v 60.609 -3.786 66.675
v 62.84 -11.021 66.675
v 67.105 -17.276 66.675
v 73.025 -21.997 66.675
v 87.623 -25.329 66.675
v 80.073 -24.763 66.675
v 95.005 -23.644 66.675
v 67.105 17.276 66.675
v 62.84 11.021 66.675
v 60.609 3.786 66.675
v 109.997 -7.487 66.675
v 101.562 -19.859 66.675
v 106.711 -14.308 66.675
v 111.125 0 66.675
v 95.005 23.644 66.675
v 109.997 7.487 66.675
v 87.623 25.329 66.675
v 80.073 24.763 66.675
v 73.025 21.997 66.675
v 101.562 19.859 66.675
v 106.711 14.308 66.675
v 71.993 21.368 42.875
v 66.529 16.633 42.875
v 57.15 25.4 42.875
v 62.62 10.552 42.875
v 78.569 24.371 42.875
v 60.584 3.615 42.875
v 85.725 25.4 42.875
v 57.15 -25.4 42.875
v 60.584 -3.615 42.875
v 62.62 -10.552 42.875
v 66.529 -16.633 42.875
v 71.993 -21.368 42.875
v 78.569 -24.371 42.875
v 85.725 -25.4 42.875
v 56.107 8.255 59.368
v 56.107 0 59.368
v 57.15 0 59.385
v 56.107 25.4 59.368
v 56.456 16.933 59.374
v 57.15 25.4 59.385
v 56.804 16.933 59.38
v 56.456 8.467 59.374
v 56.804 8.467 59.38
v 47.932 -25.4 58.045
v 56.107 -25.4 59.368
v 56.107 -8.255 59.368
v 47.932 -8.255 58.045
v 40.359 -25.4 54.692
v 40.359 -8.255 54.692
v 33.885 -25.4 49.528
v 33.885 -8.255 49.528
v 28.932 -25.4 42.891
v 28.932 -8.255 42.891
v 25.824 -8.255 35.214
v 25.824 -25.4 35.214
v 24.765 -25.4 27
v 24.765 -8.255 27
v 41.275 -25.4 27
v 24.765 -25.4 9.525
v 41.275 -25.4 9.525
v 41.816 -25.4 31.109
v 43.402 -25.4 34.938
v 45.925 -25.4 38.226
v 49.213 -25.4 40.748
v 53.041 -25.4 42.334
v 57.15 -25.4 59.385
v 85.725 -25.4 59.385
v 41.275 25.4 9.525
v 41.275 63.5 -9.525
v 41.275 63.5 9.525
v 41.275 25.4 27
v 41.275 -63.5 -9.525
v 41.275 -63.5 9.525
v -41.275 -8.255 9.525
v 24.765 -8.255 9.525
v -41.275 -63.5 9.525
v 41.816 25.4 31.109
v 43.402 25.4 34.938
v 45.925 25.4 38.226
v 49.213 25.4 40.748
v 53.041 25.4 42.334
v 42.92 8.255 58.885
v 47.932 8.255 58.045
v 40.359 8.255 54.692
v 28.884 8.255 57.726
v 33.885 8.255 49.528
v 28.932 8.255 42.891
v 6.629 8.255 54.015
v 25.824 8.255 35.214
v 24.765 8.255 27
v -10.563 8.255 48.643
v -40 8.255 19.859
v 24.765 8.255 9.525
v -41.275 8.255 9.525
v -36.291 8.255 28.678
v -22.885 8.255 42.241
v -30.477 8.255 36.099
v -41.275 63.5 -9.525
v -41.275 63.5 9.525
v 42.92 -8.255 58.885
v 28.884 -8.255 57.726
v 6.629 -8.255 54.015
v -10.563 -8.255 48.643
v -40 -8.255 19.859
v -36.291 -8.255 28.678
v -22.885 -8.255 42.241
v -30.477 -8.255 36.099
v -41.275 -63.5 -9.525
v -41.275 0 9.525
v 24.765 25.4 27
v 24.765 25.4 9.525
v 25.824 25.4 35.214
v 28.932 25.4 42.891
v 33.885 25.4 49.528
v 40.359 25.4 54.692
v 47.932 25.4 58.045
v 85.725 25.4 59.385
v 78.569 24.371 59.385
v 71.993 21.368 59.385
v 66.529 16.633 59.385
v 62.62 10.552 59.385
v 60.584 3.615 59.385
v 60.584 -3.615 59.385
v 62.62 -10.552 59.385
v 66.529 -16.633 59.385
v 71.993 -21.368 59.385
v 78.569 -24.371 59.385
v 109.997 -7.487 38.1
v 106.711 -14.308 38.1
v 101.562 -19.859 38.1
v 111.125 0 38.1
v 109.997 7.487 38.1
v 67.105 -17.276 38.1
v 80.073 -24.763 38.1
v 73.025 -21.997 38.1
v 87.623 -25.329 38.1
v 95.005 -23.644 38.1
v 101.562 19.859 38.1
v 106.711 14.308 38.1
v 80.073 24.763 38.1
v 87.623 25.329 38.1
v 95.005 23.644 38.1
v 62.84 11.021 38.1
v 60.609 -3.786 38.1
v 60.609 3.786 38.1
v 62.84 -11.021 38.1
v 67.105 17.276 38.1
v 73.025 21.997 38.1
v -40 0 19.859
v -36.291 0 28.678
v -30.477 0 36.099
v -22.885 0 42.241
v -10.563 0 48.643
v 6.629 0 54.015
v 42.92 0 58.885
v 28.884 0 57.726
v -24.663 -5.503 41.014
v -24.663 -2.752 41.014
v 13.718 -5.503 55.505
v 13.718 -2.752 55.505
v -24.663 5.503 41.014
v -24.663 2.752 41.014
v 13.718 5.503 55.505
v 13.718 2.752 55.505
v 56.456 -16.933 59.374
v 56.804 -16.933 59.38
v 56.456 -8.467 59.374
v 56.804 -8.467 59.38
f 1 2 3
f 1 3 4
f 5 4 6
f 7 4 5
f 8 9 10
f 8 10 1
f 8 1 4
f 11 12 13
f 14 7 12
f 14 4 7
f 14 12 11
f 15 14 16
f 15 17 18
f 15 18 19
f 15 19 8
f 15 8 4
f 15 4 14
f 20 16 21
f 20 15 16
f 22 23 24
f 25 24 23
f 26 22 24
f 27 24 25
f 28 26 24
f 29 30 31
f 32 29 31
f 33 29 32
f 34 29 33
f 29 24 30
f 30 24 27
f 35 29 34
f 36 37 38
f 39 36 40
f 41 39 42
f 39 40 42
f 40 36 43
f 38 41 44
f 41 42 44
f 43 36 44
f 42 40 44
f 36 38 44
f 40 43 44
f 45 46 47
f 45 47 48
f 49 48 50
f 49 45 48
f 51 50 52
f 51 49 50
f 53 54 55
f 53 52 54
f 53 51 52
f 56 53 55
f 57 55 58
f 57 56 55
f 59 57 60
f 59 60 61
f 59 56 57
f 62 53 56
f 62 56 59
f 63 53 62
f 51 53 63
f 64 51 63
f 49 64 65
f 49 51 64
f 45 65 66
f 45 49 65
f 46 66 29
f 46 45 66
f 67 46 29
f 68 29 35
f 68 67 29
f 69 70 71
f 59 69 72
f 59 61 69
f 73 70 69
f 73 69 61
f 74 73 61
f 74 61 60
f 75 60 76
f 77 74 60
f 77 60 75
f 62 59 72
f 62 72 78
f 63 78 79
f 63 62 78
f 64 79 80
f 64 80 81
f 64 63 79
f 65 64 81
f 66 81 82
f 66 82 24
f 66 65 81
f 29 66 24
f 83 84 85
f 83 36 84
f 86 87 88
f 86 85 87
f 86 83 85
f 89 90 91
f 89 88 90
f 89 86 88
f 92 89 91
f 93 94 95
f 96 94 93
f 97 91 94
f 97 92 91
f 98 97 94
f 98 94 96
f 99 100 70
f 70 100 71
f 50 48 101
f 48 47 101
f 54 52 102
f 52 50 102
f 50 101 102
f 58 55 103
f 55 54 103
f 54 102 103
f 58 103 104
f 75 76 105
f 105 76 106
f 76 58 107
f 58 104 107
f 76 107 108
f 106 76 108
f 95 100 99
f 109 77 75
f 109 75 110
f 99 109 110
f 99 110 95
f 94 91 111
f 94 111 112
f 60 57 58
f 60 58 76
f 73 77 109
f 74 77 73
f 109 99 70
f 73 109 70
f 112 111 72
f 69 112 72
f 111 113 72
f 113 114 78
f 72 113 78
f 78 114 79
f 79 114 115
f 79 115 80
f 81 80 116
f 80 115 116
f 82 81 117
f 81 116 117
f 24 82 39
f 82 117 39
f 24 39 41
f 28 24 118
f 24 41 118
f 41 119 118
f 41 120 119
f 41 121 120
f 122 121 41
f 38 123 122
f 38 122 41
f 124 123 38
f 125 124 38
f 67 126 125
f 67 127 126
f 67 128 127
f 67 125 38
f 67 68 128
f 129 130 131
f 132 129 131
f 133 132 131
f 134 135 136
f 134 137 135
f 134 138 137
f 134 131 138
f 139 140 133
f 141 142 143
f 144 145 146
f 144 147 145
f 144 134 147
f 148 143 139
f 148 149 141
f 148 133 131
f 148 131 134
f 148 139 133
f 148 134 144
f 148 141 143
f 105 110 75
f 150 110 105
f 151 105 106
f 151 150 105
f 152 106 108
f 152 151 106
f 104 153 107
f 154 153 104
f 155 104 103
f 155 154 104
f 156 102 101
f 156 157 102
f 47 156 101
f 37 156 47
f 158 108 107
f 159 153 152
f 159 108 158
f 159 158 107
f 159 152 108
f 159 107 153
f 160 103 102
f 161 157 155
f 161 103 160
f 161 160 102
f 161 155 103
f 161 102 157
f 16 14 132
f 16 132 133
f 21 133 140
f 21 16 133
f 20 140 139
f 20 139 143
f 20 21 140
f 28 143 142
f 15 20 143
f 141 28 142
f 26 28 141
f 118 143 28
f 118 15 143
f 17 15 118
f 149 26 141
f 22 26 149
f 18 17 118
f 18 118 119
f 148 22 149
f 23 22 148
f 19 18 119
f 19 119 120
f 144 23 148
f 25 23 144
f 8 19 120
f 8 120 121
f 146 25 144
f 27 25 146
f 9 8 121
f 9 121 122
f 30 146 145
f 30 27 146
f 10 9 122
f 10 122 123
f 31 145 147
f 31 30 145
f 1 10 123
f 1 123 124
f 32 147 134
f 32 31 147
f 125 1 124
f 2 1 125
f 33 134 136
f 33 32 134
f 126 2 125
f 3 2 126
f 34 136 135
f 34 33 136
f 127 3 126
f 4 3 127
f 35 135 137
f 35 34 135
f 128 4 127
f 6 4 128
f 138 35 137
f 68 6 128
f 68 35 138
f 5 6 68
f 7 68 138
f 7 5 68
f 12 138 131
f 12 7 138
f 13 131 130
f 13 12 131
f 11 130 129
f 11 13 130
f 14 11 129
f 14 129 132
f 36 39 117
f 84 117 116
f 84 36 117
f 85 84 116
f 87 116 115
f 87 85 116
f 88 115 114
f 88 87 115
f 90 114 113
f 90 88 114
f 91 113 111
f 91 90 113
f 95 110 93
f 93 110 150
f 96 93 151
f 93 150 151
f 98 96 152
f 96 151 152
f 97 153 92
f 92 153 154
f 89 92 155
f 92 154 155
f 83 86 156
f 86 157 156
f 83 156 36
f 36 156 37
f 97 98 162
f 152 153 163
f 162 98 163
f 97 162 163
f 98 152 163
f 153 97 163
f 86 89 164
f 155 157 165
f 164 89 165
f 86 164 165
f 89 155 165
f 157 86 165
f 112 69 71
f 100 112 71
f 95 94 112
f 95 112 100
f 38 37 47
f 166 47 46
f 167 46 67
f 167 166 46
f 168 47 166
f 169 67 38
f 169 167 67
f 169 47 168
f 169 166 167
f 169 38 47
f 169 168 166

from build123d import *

# Parameters (mm, degrees)
F1_DEPTH = 63.5
F0_W     = 25.4
F0_H     = 16.5099985898
F2_DEPTH = 25.4
F3_DEPTH = 8.255


with BuildPart() as f1:
    # F0 (on Front) → F1 (new body, symmetric)
    with BuildSketch(Plane.XZ):
        Polygon((24.7650014102, 9.525), (-41.275, 9.525), (-41.275, -9.525), (41.275, -9.525), (41.275, 9.525), align=None)
    extrude(amount=F1_DEPTH, both=True)

    # F0 (on Front) → F2 (join, symmetric)
    with BuildSketch(Plane.XZ):
        with BuildLine():
            Line((24.7650014102, 27.0002), (24.7650014102, 9.525))
            Line((24.7650014102, 9.525), (41.275, 9.525))
            Line((41.275, 9.525), (41.275, 27.0002))
            ThreePointArc((41.275, 27.0002), (45.9246798487, 38.2255201513), (57.15, 42.8752))
            Line((57.15, 42.8752), (60.325, 42.8752))
            Line((60.325, 42.8752), (60.325, 59.3851985898))
            Line((60.325, 59.3851985898), (57.15, 59.3851985898))
            add(Edge.make_bspline(
                [(56.1071182256, 59.3684024719), (56.4564666589, 59.3745204877), (56.8041138662, 59.3801120386), (57.15, 59.3851985898)],
                knots=[109.340800828, 109.340800828, 109.340800828, 109.340800828, 110.3336758583, 110.3336758583, 110.3336758583, 110.3336758583], degree=3))
            ThreePointArc((56.1071182256, 59.3684024719), (33.8845550392, 49.5281205528), (24.7650014102, 27.0002))
        make_face()
        with Locations((73.025, 51.1301992949)):
            Rectangle(F0_W, F0_H)
    extrude(amount=F2_DEPTH, both=True)

    # F0 (on Front) → F3 (join, symmetric)
    with BuildSketch(Plane.XZ):
        with BuildLine():
            add(Edge.make_bspline(
                [(-41.275, 9.525), (-41.4689933248, 51.6361419003), (17.6349678521, 58.6946532825), (56.1071182256, 59.3684024719)],
                knots=[0, 0, 0, 0, 109.340800828, 109.340800828, 109.340800828, 109.340800828], degree=3))
            Line((-41.275, 9.525), (24.7650014102, 9.525))
            Line((24.7650014102, 9.525), (24.7650014102, 27.0002))
            ThreePointArc((24.7650014102, 27.0002), (33.8845550392, 49.5281205528), (56.1071182256, 59.3684024719))
        make_face()
    extrude(amount=F3_DEPTH, both=True)

    # F0 (on Front) → F4 (revolve)
    with BuildSketch(Plane.XZ):
        Polygon((85.725, 66.675), (85.725, 59.3851985898), (85.725, 42.8752), (85.725, 38.1), (111.125, 38.1), (111.125, 66.675), align=None)
    revolve(axis=Axis((85.725, 0, 52.3875), (0, 0, 1)))


solid = f1.part
